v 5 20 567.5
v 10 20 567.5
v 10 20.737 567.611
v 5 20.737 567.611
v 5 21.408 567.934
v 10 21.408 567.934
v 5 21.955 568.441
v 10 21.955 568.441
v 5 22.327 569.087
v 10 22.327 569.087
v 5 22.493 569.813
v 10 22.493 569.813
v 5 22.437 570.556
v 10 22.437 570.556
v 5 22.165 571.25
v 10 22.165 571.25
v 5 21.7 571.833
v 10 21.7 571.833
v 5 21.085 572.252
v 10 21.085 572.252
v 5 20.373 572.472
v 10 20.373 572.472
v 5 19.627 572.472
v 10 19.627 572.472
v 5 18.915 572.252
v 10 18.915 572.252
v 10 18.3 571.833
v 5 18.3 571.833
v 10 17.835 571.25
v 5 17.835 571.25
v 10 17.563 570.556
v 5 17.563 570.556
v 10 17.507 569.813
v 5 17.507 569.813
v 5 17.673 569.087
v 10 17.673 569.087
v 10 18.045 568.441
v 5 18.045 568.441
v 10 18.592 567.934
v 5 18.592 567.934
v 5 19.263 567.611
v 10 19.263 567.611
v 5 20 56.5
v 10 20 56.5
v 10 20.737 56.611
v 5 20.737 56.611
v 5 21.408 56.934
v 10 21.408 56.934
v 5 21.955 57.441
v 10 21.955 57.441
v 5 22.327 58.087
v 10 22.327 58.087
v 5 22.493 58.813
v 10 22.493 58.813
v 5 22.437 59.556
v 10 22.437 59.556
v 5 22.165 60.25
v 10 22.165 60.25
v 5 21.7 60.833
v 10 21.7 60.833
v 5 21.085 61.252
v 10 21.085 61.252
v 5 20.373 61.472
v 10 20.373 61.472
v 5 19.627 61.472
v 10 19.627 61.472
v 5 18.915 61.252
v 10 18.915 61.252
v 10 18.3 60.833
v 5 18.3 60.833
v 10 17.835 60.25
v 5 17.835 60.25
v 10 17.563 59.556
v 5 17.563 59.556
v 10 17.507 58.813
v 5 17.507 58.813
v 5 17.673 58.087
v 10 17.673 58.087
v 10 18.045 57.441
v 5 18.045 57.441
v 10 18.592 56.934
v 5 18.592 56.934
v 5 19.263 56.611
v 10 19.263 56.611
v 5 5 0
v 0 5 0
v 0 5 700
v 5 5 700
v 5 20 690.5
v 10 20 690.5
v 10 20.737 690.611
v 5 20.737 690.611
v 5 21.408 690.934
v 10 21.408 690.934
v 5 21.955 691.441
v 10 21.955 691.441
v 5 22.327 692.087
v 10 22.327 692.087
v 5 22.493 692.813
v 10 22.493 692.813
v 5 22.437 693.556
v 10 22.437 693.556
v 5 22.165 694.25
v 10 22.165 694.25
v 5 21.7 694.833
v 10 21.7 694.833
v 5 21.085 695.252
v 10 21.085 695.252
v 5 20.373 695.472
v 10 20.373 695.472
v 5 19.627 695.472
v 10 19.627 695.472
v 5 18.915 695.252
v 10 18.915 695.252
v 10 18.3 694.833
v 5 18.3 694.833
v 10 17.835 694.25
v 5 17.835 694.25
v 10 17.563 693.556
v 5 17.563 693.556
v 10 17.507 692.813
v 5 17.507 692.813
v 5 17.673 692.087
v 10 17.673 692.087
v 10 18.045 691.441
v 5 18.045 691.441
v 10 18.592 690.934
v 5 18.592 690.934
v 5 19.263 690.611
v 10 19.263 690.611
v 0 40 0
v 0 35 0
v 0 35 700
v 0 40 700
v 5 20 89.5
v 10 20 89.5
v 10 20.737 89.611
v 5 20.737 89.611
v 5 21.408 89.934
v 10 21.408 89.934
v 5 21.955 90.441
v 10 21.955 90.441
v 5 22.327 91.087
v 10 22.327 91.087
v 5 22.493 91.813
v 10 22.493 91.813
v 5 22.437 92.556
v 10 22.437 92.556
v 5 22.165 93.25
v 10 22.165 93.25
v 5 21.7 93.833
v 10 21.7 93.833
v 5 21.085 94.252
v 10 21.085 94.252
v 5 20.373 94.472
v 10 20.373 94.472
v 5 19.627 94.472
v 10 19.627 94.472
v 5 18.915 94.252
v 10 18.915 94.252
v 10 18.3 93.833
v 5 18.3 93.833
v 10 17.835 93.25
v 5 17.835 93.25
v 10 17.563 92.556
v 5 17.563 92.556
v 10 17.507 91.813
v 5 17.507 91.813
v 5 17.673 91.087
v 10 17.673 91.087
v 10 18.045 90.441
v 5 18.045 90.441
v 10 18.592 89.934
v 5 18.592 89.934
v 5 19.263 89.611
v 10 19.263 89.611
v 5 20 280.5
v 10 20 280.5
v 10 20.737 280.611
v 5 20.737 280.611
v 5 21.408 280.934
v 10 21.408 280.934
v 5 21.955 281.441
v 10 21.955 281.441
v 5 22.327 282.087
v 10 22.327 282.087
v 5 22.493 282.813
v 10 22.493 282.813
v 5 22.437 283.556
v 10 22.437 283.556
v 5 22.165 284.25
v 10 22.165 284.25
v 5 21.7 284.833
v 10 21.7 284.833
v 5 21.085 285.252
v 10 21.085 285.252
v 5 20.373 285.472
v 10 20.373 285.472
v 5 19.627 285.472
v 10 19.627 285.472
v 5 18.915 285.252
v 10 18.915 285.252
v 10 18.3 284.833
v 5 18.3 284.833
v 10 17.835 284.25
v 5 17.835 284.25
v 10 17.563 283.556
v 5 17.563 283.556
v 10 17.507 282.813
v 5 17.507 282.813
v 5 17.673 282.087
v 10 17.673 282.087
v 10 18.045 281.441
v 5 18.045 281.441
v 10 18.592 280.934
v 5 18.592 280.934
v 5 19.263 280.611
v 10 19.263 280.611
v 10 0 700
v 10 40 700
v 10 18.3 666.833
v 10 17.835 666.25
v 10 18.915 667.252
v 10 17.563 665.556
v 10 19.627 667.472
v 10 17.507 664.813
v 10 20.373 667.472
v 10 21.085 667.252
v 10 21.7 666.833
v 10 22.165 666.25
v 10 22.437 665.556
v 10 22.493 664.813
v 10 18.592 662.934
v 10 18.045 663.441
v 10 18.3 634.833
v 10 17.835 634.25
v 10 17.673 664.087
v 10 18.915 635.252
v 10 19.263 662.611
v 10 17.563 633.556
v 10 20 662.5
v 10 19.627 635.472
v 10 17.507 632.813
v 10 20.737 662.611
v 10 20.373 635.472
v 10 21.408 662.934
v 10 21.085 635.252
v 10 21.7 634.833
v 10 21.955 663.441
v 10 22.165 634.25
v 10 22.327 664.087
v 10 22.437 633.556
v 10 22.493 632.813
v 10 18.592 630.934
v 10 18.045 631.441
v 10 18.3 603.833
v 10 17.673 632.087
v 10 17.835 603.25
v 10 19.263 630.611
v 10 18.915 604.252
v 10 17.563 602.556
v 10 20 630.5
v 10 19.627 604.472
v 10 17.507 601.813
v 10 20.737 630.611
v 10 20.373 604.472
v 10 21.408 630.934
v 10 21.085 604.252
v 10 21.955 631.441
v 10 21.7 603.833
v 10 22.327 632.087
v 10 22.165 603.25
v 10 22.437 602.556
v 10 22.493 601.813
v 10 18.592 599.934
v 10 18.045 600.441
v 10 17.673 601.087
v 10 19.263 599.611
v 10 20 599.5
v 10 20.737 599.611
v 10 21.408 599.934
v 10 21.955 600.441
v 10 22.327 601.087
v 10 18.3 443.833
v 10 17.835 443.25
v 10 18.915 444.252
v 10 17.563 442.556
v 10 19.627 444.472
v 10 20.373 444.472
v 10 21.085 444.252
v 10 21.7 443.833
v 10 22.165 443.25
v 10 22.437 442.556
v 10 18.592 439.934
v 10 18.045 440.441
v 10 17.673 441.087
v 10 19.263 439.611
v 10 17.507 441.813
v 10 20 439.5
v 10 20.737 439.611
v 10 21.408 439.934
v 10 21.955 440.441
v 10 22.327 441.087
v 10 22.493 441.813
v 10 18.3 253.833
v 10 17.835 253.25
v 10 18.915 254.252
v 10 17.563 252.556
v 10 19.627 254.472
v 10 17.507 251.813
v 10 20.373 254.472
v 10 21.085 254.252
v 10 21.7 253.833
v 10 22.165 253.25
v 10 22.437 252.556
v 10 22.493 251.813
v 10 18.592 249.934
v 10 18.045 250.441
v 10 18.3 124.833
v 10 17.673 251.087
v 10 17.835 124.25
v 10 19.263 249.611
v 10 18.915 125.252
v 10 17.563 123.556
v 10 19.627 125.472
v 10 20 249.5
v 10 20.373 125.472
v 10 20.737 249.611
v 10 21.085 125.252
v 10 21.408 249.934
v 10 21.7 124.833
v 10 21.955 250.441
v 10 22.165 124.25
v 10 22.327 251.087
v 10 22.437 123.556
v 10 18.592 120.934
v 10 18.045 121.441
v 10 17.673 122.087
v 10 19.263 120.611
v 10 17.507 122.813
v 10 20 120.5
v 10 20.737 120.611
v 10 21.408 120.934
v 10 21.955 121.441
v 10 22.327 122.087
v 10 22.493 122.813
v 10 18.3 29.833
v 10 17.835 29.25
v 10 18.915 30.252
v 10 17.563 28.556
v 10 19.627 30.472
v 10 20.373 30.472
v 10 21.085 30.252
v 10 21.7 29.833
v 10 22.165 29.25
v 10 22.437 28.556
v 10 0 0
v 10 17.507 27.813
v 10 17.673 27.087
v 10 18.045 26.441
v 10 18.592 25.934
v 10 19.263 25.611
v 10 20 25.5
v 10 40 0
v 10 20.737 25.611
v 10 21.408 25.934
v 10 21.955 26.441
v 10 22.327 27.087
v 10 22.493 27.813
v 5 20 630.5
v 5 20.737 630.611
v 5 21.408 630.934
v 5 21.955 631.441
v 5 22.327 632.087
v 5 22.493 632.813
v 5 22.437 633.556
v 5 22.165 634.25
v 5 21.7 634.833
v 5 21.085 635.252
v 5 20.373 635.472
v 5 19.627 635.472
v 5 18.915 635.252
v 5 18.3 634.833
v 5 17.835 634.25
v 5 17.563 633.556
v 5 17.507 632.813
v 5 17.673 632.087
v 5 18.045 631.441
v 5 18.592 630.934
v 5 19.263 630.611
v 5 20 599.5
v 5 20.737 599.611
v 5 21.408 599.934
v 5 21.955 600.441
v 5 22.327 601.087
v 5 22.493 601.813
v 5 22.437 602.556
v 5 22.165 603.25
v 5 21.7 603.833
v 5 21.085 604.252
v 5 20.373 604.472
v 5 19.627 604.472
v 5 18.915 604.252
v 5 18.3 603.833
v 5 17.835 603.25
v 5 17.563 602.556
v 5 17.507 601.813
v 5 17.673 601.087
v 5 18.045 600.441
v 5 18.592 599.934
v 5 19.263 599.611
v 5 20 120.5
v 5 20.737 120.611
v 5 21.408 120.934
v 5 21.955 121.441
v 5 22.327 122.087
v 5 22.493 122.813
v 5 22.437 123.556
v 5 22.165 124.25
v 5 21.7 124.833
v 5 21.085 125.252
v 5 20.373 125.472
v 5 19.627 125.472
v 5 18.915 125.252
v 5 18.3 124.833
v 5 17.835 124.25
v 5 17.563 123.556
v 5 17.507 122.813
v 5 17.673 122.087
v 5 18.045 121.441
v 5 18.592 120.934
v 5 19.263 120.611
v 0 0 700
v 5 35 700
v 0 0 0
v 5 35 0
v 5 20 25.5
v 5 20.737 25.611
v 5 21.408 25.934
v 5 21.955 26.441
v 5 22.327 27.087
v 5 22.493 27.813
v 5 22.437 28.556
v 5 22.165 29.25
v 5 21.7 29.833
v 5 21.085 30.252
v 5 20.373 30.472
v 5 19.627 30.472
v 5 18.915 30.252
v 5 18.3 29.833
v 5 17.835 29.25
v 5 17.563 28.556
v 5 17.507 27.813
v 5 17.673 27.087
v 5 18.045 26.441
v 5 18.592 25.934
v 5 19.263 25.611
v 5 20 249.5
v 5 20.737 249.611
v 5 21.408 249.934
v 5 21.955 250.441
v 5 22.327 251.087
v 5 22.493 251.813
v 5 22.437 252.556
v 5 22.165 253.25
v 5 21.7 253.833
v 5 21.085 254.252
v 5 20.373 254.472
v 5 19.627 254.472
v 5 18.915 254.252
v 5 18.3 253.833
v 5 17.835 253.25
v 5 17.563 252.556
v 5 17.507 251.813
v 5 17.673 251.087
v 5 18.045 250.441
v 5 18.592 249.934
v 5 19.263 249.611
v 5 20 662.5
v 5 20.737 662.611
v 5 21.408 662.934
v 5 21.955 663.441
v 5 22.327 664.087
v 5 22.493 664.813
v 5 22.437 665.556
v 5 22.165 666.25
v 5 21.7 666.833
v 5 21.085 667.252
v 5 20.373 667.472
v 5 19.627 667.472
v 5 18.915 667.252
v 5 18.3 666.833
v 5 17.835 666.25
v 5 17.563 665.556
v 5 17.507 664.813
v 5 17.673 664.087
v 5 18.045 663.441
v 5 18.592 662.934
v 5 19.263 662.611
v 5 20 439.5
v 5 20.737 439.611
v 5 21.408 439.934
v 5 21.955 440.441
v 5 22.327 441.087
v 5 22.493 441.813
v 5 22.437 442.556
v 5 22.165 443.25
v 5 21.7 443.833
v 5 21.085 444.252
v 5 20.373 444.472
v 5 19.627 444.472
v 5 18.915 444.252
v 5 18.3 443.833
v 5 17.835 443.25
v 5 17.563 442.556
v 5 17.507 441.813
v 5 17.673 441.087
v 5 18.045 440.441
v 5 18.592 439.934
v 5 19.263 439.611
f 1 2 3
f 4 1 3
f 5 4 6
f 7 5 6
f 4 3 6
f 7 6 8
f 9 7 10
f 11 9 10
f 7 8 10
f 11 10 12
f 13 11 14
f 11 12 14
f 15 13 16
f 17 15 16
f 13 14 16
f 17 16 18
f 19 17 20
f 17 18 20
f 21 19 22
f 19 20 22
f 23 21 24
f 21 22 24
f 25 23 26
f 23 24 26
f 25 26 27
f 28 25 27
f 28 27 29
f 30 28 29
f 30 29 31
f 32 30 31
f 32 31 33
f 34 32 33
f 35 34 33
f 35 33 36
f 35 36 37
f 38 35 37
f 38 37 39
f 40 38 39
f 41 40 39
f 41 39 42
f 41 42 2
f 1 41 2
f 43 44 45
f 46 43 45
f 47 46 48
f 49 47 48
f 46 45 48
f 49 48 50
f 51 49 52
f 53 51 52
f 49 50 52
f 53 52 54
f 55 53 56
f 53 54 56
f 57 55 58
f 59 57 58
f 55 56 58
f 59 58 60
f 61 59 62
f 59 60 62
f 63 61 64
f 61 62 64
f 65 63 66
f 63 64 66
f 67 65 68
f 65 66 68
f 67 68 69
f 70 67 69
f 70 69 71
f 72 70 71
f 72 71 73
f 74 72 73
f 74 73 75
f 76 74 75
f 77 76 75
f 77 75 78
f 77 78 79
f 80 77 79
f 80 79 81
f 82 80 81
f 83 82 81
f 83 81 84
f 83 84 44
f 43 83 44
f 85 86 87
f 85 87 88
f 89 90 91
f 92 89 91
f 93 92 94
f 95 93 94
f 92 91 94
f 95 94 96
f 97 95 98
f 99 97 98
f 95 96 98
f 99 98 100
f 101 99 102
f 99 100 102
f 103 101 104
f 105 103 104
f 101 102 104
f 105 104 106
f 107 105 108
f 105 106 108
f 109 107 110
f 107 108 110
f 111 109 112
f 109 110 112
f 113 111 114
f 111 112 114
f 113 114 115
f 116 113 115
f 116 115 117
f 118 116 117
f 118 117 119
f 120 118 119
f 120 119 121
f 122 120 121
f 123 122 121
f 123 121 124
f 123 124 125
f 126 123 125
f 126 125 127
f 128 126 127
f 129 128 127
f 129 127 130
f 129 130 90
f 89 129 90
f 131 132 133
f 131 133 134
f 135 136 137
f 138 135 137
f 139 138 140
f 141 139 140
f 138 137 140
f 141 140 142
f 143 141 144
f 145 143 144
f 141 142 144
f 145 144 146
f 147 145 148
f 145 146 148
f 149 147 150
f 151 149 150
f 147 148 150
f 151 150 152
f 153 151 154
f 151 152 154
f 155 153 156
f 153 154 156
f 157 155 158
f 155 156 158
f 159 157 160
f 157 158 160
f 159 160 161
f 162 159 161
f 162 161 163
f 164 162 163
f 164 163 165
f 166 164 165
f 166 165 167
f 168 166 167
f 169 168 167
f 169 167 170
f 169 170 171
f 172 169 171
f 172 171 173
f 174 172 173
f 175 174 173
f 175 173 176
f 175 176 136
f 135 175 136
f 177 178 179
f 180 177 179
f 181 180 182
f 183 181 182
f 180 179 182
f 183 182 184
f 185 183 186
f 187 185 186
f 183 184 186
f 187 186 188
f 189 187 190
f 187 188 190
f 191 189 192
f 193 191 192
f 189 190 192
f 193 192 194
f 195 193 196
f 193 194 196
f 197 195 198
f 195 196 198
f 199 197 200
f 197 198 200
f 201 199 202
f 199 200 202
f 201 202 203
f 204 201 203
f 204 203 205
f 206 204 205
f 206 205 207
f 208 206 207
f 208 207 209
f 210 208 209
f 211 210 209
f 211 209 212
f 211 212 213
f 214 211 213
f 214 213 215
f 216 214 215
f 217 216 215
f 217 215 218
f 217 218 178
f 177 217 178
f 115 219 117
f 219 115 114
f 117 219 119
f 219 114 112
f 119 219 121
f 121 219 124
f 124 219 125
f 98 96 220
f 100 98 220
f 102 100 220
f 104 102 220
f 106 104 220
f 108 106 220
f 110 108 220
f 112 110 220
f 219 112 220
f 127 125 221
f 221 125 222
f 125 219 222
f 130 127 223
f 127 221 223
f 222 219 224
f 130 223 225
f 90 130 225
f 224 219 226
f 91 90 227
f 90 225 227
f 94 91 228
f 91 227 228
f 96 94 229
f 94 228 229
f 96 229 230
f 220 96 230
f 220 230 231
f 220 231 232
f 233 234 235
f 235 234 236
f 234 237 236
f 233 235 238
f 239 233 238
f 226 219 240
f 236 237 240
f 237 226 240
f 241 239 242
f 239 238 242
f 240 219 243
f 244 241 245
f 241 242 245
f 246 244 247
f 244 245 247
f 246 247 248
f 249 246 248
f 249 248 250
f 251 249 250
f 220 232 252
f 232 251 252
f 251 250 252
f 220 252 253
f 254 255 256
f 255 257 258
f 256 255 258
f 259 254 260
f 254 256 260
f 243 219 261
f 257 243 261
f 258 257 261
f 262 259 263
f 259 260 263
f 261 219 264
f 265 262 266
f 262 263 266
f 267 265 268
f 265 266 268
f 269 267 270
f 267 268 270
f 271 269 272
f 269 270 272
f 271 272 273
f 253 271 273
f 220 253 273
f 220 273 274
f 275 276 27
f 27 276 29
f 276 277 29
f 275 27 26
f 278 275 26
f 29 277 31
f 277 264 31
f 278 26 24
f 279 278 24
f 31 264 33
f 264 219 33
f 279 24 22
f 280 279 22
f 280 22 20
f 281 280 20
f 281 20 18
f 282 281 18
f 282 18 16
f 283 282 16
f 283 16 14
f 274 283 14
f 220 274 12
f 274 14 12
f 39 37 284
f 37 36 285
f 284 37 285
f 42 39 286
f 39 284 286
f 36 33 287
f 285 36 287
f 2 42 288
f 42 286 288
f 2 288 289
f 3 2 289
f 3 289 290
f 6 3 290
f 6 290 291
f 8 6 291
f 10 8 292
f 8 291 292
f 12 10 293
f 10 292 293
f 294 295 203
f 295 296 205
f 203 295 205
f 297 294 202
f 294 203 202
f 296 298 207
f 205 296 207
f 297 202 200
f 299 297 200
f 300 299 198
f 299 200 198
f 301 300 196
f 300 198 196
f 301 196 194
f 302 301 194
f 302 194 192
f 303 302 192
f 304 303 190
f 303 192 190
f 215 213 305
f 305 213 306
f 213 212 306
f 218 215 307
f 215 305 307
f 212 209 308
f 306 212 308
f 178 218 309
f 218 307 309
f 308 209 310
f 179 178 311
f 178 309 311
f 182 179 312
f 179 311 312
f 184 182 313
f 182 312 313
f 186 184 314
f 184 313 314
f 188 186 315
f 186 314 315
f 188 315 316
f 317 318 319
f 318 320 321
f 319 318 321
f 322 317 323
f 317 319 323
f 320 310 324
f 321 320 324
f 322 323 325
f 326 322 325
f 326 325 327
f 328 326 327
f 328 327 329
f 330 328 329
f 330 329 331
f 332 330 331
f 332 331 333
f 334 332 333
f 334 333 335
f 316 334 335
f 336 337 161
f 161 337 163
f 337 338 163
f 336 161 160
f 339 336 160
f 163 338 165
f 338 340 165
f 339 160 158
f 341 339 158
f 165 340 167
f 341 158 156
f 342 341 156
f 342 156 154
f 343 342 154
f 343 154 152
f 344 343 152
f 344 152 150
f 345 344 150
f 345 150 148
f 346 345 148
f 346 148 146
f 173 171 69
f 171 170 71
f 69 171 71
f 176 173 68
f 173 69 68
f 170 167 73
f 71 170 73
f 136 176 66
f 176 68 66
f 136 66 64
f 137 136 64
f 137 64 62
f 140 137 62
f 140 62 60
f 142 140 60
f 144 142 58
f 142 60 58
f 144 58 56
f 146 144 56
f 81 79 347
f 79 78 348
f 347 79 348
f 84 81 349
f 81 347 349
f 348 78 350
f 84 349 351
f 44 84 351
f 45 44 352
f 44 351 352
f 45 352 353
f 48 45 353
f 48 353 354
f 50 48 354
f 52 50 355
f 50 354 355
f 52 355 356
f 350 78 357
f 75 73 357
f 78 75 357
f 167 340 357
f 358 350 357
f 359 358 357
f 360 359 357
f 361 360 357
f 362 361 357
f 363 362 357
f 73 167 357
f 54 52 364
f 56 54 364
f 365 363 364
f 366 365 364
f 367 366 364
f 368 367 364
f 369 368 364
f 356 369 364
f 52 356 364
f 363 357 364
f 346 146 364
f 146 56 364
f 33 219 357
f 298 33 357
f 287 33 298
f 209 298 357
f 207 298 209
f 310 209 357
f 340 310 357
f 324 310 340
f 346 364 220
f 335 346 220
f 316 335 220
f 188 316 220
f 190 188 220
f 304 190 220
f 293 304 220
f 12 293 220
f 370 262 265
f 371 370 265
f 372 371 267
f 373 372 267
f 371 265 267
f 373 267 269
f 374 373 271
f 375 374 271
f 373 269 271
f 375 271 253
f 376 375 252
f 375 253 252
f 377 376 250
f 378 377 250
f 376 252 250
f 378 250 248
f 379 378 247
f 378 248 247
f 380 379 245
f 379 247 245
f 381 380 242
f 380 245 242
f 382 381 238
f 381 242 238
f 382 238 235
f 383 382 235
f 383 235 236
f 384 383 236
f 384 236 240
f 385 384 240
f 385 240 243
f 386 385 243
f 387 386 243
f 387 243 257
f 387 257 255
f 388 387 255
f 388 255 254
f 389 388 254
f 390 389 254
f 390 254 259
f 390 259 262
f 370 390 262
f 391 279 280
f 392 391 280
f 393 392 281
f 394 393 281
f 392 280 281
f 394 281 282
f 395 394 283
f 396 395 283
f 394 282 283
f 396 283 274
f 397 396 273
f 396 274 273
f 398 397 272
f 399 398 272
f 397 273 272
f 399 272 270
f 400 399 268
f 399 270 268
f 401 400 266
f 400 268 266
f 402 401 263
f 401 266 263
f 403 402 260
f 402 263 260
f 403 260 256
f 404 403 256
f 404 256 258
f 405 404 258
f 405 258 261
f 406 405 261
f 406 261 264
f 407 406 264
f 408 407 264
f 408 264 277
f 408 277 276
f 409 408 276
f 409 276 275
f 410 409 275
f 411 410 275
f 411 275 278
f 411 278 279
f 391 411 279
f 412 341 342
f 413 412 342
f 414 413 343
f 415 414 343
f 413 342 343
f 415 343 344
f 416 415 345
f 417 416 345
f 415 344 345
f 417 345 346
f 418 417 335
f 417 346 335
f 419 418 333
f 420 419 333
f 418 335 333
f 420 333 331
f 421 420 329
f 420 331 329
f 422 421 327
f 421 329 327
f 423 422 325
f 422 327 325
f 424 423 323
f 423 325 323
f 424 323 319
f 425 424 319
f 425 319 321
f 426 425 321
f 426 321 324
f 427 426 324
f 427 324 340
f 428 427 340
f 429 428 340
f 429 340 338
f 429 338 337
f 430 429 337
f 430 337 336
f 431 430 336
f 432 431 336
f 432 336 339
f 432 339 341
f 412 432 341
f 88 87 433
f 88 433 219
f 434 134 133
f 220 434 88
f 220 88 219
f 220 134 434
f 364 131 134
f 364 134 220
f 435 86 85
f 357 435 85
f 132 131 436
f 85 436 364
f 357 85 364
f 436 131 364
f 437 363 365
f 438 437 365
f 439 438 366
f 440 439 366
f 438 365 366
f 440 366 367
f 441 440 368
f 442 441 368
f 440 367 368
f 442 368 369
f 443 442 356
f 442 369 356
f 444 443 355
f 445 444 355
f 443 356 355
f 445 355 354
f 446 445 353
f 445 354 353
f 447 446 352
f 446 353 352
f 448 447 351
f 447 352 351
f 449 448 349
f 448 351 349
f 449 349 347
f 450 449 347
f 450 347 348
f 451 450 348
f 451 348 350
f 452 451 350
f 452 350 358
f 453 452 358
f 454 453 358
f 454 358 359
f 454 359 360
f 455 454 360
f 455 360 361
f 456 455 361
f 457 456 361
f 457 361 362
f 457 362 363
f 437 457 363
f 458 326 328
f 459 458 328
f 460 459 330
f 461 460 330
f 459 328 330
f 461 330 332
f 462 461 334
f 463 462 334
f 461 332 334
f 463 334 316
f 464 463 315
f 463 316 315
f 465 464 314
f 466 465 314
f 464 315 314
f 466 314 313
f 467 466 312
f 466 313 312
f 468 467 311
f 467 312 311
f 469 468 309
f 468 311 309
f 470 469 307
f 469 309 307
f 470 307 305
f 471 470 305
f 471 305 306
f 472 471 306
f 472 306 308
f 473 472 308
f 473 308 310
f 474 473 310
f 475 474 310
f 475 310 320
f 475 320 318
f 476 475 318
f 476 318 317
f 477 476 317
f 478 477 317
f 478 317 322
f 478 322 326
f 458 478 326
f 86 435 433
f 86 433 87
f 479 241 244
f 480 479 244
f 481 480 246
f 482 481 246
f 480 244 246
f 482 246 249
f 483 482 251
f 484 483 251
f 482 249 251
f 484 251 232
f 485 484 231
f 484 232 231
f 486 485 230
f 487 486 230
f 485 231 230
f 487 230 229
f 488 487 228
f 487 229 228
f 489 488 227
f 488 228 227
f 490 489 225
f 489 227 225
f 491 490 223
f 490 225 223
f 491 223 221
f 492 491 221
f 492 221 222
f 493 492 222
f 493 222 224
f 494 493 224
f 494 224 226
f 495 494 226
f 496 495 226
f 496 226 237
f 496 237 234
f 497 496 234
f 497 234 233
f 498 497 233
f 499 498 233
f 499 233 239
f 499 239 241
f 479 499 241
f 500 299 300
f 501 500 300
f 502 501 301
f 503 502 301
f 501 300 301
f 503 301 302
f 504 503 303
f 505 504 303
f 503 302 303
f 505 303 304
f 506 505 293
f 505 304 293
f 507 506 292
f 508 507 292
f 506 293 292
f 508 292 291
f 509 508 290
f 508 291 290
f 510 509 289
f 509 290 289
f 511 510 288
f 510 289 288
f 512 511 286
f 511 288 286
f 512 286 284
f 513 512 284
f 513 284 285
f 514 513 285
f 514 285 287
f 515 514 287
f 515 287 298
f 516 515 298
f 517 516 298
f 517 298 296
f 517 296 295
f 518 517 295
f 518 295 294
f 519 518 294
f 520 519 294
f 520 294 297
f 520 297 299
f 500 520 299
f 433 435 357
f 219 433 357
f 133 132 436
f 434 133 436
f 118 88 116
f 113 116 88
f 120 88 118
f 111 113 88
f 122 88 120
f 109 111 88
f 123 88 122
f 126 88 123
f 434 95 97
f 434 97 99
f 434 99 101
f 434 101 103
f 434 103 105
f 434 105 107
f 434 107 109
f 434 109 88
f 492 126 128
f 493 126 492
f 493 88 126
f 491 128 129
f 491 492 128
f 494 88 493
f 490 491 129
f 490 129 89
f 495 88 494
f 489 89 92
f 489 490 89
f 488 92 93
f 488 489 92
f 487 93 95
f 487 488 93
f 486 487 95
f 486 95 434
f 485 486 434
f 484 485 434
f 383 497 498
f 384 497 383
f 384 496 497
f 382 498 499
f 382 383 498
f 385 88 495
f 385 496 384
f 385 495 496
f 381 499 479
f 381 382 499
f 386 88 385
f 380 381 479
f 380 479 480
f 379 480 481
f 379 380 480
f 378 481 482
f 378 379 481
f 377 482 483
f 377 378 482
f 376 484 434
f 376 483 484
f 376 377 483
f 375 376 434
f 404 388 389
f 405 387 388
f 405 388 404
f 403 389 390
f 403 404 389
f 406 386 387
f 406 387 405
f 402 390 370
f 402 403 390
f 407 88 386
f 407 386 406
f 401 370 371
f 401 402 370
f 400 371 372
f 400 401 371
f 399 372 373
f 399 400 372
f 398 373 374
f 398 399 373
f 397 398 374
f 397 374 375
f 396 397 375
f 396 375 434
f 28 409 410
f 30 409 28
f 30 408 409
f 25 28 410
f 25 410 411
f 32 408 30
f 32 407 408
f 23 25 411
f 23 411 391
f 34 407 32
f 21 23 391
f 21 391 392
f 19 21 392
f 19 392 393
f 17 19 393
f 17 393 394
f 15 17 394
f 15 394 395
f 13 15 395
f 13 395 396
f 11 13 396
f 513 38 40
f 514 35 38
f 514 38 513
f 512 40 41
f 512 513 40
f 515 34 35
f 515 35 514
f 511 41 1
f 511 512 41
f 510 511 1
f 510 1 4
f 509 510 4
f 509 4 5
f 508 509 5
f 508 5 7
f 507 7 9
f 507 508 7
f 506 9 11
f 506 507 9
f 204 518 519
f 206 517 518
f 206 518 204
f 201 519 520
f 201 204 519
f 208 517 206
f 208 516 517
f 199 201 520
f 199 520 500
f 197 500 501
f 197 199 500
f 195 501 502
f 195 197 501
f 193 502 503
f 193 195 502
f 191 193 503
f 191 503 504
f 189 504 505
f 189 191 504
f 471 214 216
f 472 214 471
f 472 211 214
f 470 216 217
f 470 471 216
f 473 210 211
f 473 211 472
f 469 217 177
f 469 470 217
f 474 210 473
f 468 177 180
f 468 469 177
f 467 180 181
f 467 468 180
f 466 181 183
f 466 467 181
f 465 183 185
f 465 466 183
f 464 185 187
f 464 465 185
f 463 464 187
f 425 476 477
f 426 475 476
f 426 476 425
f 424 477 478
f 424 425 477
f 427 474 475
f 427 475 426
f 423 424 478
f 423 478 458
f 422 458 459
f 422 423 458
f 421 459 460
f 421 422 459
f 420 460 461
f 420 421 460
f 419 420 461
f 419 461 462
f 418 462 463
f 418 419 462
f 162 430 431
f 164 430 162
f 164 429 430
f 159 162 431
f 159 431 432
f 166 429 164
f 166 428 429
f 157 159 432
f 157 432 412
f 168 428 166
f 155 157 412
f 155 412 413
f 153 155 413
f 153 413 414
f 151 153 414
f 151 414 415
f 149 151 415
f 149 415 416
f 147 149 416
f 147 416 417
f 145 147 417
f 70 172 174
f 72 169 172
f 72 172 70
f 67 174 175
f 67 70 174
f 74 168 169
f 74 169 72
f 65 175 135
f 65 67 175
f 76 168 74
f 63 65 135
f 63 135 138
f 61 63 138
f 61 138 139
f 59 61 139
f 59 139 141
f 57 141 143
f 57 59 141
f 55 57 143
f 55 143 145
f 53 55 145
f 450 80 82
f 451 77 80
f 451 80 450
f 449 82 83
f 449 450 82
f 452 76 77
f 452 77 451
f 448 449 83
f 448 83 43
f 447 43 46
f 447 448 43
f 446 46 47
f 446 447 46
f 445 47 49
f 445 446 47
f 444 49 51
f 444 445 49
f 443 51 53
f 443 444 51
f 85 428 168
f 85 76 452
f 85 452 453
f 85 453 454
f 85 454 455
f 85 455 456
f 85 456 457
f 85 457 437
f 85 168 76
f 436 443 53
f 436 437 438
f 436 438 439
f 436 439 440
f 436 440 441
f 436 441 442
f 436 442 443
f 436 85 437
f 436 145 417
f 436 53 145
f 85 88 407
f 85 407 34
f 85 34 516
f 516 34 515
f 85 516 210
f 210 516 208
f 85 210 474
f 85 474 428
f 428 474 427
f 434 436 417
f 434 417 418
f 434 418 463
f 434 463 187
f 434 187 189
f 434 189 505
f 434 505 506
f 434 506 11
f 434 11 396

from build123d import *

# Parameters (mm, degrees)
SKETCH1_W               = 10
SKETCH1_H               = 40
BOSS_EXTRUDE1_DEPTH     = 700
CUT_EXTRUDE1_DEPTH      = 702.21323433
CUT_EXTRUDE1_DEPTH_BACK = 702.21323433
SKETCH2_W               = 5
SKETCH2_H               = 30
SKETCH3_R               = 2.5
CUT_EXTRUDE2_DEPTH      = 702.21323433


with BuildPart() as part:
    # Sketch1 → Boss-Extrude1 (new body)
    with BuildSketch(Plane.XY):
        with Locations((5, 20)):
            Rectangle(SKETCH1_W, SKETCH1_H)
    extrude(amount=BOSS_EXTRUDE1_DEPTH)

    # Sketch2 → Cut-Extrude1 (cut, two sides: drawn at the far end of the back side and taken through both)
    with BuildSketch(Plane.XY.offset(700).offset(-CUT_EXTRUDE1_DEPTH_BACK)):
        with Locations((2.5, 20)):
            Rectangle(SKETCH2_W, SKETCH2_H)
    extrude(amount=CUT_EXTRUDE1_DEPTH + CUT_EXTRUDE1_DEPTH_BACK, mode=Mode.SUBTRACT)

    # Sketch3 → Cut-Extrude2 (cut, through all)
    with BuildSketch(Plane(origin=(10, 0, 0), x_dir=(0, 0, -1), z_dir=(1, 0, 0))):
        with Locations((-693, 20)):
            Circle(SKETCH3_R)
        with Locations((-665, 20)):
            Circle(SKETCH3_R)
        with Locations((-633, 20)):
            Circle(SKETCH3_R)
        with Locations((-602, 20)):
            Circle(SKETCH3_R)
        with Locations((-570, 20)):
            Circle(SKETCH3_R)
        with Locations((-442, 20)):
            Circle(SKETCH3_R)
        with Locations((-283, 20)):
            Circle(SKETCH3_R)
        with Locations((-252, 20)):
            Circle(SKETCH3_R)
        with Locations((-123, 20)):
            Circle(SKETCH3_R)
        with Locations((-92, 20)):
            Circle(SKETCH3_R)
        with Locations((-59, 20)):
            Circle(SKETCH3_R)
        with Locations((-28, 20)):
            Circle(SKETCH3_R)
    extrude(amount=-CUT_EXTRUDE2_DEPTH, mode=Mode.SUBTRACT)


solid = part.part
